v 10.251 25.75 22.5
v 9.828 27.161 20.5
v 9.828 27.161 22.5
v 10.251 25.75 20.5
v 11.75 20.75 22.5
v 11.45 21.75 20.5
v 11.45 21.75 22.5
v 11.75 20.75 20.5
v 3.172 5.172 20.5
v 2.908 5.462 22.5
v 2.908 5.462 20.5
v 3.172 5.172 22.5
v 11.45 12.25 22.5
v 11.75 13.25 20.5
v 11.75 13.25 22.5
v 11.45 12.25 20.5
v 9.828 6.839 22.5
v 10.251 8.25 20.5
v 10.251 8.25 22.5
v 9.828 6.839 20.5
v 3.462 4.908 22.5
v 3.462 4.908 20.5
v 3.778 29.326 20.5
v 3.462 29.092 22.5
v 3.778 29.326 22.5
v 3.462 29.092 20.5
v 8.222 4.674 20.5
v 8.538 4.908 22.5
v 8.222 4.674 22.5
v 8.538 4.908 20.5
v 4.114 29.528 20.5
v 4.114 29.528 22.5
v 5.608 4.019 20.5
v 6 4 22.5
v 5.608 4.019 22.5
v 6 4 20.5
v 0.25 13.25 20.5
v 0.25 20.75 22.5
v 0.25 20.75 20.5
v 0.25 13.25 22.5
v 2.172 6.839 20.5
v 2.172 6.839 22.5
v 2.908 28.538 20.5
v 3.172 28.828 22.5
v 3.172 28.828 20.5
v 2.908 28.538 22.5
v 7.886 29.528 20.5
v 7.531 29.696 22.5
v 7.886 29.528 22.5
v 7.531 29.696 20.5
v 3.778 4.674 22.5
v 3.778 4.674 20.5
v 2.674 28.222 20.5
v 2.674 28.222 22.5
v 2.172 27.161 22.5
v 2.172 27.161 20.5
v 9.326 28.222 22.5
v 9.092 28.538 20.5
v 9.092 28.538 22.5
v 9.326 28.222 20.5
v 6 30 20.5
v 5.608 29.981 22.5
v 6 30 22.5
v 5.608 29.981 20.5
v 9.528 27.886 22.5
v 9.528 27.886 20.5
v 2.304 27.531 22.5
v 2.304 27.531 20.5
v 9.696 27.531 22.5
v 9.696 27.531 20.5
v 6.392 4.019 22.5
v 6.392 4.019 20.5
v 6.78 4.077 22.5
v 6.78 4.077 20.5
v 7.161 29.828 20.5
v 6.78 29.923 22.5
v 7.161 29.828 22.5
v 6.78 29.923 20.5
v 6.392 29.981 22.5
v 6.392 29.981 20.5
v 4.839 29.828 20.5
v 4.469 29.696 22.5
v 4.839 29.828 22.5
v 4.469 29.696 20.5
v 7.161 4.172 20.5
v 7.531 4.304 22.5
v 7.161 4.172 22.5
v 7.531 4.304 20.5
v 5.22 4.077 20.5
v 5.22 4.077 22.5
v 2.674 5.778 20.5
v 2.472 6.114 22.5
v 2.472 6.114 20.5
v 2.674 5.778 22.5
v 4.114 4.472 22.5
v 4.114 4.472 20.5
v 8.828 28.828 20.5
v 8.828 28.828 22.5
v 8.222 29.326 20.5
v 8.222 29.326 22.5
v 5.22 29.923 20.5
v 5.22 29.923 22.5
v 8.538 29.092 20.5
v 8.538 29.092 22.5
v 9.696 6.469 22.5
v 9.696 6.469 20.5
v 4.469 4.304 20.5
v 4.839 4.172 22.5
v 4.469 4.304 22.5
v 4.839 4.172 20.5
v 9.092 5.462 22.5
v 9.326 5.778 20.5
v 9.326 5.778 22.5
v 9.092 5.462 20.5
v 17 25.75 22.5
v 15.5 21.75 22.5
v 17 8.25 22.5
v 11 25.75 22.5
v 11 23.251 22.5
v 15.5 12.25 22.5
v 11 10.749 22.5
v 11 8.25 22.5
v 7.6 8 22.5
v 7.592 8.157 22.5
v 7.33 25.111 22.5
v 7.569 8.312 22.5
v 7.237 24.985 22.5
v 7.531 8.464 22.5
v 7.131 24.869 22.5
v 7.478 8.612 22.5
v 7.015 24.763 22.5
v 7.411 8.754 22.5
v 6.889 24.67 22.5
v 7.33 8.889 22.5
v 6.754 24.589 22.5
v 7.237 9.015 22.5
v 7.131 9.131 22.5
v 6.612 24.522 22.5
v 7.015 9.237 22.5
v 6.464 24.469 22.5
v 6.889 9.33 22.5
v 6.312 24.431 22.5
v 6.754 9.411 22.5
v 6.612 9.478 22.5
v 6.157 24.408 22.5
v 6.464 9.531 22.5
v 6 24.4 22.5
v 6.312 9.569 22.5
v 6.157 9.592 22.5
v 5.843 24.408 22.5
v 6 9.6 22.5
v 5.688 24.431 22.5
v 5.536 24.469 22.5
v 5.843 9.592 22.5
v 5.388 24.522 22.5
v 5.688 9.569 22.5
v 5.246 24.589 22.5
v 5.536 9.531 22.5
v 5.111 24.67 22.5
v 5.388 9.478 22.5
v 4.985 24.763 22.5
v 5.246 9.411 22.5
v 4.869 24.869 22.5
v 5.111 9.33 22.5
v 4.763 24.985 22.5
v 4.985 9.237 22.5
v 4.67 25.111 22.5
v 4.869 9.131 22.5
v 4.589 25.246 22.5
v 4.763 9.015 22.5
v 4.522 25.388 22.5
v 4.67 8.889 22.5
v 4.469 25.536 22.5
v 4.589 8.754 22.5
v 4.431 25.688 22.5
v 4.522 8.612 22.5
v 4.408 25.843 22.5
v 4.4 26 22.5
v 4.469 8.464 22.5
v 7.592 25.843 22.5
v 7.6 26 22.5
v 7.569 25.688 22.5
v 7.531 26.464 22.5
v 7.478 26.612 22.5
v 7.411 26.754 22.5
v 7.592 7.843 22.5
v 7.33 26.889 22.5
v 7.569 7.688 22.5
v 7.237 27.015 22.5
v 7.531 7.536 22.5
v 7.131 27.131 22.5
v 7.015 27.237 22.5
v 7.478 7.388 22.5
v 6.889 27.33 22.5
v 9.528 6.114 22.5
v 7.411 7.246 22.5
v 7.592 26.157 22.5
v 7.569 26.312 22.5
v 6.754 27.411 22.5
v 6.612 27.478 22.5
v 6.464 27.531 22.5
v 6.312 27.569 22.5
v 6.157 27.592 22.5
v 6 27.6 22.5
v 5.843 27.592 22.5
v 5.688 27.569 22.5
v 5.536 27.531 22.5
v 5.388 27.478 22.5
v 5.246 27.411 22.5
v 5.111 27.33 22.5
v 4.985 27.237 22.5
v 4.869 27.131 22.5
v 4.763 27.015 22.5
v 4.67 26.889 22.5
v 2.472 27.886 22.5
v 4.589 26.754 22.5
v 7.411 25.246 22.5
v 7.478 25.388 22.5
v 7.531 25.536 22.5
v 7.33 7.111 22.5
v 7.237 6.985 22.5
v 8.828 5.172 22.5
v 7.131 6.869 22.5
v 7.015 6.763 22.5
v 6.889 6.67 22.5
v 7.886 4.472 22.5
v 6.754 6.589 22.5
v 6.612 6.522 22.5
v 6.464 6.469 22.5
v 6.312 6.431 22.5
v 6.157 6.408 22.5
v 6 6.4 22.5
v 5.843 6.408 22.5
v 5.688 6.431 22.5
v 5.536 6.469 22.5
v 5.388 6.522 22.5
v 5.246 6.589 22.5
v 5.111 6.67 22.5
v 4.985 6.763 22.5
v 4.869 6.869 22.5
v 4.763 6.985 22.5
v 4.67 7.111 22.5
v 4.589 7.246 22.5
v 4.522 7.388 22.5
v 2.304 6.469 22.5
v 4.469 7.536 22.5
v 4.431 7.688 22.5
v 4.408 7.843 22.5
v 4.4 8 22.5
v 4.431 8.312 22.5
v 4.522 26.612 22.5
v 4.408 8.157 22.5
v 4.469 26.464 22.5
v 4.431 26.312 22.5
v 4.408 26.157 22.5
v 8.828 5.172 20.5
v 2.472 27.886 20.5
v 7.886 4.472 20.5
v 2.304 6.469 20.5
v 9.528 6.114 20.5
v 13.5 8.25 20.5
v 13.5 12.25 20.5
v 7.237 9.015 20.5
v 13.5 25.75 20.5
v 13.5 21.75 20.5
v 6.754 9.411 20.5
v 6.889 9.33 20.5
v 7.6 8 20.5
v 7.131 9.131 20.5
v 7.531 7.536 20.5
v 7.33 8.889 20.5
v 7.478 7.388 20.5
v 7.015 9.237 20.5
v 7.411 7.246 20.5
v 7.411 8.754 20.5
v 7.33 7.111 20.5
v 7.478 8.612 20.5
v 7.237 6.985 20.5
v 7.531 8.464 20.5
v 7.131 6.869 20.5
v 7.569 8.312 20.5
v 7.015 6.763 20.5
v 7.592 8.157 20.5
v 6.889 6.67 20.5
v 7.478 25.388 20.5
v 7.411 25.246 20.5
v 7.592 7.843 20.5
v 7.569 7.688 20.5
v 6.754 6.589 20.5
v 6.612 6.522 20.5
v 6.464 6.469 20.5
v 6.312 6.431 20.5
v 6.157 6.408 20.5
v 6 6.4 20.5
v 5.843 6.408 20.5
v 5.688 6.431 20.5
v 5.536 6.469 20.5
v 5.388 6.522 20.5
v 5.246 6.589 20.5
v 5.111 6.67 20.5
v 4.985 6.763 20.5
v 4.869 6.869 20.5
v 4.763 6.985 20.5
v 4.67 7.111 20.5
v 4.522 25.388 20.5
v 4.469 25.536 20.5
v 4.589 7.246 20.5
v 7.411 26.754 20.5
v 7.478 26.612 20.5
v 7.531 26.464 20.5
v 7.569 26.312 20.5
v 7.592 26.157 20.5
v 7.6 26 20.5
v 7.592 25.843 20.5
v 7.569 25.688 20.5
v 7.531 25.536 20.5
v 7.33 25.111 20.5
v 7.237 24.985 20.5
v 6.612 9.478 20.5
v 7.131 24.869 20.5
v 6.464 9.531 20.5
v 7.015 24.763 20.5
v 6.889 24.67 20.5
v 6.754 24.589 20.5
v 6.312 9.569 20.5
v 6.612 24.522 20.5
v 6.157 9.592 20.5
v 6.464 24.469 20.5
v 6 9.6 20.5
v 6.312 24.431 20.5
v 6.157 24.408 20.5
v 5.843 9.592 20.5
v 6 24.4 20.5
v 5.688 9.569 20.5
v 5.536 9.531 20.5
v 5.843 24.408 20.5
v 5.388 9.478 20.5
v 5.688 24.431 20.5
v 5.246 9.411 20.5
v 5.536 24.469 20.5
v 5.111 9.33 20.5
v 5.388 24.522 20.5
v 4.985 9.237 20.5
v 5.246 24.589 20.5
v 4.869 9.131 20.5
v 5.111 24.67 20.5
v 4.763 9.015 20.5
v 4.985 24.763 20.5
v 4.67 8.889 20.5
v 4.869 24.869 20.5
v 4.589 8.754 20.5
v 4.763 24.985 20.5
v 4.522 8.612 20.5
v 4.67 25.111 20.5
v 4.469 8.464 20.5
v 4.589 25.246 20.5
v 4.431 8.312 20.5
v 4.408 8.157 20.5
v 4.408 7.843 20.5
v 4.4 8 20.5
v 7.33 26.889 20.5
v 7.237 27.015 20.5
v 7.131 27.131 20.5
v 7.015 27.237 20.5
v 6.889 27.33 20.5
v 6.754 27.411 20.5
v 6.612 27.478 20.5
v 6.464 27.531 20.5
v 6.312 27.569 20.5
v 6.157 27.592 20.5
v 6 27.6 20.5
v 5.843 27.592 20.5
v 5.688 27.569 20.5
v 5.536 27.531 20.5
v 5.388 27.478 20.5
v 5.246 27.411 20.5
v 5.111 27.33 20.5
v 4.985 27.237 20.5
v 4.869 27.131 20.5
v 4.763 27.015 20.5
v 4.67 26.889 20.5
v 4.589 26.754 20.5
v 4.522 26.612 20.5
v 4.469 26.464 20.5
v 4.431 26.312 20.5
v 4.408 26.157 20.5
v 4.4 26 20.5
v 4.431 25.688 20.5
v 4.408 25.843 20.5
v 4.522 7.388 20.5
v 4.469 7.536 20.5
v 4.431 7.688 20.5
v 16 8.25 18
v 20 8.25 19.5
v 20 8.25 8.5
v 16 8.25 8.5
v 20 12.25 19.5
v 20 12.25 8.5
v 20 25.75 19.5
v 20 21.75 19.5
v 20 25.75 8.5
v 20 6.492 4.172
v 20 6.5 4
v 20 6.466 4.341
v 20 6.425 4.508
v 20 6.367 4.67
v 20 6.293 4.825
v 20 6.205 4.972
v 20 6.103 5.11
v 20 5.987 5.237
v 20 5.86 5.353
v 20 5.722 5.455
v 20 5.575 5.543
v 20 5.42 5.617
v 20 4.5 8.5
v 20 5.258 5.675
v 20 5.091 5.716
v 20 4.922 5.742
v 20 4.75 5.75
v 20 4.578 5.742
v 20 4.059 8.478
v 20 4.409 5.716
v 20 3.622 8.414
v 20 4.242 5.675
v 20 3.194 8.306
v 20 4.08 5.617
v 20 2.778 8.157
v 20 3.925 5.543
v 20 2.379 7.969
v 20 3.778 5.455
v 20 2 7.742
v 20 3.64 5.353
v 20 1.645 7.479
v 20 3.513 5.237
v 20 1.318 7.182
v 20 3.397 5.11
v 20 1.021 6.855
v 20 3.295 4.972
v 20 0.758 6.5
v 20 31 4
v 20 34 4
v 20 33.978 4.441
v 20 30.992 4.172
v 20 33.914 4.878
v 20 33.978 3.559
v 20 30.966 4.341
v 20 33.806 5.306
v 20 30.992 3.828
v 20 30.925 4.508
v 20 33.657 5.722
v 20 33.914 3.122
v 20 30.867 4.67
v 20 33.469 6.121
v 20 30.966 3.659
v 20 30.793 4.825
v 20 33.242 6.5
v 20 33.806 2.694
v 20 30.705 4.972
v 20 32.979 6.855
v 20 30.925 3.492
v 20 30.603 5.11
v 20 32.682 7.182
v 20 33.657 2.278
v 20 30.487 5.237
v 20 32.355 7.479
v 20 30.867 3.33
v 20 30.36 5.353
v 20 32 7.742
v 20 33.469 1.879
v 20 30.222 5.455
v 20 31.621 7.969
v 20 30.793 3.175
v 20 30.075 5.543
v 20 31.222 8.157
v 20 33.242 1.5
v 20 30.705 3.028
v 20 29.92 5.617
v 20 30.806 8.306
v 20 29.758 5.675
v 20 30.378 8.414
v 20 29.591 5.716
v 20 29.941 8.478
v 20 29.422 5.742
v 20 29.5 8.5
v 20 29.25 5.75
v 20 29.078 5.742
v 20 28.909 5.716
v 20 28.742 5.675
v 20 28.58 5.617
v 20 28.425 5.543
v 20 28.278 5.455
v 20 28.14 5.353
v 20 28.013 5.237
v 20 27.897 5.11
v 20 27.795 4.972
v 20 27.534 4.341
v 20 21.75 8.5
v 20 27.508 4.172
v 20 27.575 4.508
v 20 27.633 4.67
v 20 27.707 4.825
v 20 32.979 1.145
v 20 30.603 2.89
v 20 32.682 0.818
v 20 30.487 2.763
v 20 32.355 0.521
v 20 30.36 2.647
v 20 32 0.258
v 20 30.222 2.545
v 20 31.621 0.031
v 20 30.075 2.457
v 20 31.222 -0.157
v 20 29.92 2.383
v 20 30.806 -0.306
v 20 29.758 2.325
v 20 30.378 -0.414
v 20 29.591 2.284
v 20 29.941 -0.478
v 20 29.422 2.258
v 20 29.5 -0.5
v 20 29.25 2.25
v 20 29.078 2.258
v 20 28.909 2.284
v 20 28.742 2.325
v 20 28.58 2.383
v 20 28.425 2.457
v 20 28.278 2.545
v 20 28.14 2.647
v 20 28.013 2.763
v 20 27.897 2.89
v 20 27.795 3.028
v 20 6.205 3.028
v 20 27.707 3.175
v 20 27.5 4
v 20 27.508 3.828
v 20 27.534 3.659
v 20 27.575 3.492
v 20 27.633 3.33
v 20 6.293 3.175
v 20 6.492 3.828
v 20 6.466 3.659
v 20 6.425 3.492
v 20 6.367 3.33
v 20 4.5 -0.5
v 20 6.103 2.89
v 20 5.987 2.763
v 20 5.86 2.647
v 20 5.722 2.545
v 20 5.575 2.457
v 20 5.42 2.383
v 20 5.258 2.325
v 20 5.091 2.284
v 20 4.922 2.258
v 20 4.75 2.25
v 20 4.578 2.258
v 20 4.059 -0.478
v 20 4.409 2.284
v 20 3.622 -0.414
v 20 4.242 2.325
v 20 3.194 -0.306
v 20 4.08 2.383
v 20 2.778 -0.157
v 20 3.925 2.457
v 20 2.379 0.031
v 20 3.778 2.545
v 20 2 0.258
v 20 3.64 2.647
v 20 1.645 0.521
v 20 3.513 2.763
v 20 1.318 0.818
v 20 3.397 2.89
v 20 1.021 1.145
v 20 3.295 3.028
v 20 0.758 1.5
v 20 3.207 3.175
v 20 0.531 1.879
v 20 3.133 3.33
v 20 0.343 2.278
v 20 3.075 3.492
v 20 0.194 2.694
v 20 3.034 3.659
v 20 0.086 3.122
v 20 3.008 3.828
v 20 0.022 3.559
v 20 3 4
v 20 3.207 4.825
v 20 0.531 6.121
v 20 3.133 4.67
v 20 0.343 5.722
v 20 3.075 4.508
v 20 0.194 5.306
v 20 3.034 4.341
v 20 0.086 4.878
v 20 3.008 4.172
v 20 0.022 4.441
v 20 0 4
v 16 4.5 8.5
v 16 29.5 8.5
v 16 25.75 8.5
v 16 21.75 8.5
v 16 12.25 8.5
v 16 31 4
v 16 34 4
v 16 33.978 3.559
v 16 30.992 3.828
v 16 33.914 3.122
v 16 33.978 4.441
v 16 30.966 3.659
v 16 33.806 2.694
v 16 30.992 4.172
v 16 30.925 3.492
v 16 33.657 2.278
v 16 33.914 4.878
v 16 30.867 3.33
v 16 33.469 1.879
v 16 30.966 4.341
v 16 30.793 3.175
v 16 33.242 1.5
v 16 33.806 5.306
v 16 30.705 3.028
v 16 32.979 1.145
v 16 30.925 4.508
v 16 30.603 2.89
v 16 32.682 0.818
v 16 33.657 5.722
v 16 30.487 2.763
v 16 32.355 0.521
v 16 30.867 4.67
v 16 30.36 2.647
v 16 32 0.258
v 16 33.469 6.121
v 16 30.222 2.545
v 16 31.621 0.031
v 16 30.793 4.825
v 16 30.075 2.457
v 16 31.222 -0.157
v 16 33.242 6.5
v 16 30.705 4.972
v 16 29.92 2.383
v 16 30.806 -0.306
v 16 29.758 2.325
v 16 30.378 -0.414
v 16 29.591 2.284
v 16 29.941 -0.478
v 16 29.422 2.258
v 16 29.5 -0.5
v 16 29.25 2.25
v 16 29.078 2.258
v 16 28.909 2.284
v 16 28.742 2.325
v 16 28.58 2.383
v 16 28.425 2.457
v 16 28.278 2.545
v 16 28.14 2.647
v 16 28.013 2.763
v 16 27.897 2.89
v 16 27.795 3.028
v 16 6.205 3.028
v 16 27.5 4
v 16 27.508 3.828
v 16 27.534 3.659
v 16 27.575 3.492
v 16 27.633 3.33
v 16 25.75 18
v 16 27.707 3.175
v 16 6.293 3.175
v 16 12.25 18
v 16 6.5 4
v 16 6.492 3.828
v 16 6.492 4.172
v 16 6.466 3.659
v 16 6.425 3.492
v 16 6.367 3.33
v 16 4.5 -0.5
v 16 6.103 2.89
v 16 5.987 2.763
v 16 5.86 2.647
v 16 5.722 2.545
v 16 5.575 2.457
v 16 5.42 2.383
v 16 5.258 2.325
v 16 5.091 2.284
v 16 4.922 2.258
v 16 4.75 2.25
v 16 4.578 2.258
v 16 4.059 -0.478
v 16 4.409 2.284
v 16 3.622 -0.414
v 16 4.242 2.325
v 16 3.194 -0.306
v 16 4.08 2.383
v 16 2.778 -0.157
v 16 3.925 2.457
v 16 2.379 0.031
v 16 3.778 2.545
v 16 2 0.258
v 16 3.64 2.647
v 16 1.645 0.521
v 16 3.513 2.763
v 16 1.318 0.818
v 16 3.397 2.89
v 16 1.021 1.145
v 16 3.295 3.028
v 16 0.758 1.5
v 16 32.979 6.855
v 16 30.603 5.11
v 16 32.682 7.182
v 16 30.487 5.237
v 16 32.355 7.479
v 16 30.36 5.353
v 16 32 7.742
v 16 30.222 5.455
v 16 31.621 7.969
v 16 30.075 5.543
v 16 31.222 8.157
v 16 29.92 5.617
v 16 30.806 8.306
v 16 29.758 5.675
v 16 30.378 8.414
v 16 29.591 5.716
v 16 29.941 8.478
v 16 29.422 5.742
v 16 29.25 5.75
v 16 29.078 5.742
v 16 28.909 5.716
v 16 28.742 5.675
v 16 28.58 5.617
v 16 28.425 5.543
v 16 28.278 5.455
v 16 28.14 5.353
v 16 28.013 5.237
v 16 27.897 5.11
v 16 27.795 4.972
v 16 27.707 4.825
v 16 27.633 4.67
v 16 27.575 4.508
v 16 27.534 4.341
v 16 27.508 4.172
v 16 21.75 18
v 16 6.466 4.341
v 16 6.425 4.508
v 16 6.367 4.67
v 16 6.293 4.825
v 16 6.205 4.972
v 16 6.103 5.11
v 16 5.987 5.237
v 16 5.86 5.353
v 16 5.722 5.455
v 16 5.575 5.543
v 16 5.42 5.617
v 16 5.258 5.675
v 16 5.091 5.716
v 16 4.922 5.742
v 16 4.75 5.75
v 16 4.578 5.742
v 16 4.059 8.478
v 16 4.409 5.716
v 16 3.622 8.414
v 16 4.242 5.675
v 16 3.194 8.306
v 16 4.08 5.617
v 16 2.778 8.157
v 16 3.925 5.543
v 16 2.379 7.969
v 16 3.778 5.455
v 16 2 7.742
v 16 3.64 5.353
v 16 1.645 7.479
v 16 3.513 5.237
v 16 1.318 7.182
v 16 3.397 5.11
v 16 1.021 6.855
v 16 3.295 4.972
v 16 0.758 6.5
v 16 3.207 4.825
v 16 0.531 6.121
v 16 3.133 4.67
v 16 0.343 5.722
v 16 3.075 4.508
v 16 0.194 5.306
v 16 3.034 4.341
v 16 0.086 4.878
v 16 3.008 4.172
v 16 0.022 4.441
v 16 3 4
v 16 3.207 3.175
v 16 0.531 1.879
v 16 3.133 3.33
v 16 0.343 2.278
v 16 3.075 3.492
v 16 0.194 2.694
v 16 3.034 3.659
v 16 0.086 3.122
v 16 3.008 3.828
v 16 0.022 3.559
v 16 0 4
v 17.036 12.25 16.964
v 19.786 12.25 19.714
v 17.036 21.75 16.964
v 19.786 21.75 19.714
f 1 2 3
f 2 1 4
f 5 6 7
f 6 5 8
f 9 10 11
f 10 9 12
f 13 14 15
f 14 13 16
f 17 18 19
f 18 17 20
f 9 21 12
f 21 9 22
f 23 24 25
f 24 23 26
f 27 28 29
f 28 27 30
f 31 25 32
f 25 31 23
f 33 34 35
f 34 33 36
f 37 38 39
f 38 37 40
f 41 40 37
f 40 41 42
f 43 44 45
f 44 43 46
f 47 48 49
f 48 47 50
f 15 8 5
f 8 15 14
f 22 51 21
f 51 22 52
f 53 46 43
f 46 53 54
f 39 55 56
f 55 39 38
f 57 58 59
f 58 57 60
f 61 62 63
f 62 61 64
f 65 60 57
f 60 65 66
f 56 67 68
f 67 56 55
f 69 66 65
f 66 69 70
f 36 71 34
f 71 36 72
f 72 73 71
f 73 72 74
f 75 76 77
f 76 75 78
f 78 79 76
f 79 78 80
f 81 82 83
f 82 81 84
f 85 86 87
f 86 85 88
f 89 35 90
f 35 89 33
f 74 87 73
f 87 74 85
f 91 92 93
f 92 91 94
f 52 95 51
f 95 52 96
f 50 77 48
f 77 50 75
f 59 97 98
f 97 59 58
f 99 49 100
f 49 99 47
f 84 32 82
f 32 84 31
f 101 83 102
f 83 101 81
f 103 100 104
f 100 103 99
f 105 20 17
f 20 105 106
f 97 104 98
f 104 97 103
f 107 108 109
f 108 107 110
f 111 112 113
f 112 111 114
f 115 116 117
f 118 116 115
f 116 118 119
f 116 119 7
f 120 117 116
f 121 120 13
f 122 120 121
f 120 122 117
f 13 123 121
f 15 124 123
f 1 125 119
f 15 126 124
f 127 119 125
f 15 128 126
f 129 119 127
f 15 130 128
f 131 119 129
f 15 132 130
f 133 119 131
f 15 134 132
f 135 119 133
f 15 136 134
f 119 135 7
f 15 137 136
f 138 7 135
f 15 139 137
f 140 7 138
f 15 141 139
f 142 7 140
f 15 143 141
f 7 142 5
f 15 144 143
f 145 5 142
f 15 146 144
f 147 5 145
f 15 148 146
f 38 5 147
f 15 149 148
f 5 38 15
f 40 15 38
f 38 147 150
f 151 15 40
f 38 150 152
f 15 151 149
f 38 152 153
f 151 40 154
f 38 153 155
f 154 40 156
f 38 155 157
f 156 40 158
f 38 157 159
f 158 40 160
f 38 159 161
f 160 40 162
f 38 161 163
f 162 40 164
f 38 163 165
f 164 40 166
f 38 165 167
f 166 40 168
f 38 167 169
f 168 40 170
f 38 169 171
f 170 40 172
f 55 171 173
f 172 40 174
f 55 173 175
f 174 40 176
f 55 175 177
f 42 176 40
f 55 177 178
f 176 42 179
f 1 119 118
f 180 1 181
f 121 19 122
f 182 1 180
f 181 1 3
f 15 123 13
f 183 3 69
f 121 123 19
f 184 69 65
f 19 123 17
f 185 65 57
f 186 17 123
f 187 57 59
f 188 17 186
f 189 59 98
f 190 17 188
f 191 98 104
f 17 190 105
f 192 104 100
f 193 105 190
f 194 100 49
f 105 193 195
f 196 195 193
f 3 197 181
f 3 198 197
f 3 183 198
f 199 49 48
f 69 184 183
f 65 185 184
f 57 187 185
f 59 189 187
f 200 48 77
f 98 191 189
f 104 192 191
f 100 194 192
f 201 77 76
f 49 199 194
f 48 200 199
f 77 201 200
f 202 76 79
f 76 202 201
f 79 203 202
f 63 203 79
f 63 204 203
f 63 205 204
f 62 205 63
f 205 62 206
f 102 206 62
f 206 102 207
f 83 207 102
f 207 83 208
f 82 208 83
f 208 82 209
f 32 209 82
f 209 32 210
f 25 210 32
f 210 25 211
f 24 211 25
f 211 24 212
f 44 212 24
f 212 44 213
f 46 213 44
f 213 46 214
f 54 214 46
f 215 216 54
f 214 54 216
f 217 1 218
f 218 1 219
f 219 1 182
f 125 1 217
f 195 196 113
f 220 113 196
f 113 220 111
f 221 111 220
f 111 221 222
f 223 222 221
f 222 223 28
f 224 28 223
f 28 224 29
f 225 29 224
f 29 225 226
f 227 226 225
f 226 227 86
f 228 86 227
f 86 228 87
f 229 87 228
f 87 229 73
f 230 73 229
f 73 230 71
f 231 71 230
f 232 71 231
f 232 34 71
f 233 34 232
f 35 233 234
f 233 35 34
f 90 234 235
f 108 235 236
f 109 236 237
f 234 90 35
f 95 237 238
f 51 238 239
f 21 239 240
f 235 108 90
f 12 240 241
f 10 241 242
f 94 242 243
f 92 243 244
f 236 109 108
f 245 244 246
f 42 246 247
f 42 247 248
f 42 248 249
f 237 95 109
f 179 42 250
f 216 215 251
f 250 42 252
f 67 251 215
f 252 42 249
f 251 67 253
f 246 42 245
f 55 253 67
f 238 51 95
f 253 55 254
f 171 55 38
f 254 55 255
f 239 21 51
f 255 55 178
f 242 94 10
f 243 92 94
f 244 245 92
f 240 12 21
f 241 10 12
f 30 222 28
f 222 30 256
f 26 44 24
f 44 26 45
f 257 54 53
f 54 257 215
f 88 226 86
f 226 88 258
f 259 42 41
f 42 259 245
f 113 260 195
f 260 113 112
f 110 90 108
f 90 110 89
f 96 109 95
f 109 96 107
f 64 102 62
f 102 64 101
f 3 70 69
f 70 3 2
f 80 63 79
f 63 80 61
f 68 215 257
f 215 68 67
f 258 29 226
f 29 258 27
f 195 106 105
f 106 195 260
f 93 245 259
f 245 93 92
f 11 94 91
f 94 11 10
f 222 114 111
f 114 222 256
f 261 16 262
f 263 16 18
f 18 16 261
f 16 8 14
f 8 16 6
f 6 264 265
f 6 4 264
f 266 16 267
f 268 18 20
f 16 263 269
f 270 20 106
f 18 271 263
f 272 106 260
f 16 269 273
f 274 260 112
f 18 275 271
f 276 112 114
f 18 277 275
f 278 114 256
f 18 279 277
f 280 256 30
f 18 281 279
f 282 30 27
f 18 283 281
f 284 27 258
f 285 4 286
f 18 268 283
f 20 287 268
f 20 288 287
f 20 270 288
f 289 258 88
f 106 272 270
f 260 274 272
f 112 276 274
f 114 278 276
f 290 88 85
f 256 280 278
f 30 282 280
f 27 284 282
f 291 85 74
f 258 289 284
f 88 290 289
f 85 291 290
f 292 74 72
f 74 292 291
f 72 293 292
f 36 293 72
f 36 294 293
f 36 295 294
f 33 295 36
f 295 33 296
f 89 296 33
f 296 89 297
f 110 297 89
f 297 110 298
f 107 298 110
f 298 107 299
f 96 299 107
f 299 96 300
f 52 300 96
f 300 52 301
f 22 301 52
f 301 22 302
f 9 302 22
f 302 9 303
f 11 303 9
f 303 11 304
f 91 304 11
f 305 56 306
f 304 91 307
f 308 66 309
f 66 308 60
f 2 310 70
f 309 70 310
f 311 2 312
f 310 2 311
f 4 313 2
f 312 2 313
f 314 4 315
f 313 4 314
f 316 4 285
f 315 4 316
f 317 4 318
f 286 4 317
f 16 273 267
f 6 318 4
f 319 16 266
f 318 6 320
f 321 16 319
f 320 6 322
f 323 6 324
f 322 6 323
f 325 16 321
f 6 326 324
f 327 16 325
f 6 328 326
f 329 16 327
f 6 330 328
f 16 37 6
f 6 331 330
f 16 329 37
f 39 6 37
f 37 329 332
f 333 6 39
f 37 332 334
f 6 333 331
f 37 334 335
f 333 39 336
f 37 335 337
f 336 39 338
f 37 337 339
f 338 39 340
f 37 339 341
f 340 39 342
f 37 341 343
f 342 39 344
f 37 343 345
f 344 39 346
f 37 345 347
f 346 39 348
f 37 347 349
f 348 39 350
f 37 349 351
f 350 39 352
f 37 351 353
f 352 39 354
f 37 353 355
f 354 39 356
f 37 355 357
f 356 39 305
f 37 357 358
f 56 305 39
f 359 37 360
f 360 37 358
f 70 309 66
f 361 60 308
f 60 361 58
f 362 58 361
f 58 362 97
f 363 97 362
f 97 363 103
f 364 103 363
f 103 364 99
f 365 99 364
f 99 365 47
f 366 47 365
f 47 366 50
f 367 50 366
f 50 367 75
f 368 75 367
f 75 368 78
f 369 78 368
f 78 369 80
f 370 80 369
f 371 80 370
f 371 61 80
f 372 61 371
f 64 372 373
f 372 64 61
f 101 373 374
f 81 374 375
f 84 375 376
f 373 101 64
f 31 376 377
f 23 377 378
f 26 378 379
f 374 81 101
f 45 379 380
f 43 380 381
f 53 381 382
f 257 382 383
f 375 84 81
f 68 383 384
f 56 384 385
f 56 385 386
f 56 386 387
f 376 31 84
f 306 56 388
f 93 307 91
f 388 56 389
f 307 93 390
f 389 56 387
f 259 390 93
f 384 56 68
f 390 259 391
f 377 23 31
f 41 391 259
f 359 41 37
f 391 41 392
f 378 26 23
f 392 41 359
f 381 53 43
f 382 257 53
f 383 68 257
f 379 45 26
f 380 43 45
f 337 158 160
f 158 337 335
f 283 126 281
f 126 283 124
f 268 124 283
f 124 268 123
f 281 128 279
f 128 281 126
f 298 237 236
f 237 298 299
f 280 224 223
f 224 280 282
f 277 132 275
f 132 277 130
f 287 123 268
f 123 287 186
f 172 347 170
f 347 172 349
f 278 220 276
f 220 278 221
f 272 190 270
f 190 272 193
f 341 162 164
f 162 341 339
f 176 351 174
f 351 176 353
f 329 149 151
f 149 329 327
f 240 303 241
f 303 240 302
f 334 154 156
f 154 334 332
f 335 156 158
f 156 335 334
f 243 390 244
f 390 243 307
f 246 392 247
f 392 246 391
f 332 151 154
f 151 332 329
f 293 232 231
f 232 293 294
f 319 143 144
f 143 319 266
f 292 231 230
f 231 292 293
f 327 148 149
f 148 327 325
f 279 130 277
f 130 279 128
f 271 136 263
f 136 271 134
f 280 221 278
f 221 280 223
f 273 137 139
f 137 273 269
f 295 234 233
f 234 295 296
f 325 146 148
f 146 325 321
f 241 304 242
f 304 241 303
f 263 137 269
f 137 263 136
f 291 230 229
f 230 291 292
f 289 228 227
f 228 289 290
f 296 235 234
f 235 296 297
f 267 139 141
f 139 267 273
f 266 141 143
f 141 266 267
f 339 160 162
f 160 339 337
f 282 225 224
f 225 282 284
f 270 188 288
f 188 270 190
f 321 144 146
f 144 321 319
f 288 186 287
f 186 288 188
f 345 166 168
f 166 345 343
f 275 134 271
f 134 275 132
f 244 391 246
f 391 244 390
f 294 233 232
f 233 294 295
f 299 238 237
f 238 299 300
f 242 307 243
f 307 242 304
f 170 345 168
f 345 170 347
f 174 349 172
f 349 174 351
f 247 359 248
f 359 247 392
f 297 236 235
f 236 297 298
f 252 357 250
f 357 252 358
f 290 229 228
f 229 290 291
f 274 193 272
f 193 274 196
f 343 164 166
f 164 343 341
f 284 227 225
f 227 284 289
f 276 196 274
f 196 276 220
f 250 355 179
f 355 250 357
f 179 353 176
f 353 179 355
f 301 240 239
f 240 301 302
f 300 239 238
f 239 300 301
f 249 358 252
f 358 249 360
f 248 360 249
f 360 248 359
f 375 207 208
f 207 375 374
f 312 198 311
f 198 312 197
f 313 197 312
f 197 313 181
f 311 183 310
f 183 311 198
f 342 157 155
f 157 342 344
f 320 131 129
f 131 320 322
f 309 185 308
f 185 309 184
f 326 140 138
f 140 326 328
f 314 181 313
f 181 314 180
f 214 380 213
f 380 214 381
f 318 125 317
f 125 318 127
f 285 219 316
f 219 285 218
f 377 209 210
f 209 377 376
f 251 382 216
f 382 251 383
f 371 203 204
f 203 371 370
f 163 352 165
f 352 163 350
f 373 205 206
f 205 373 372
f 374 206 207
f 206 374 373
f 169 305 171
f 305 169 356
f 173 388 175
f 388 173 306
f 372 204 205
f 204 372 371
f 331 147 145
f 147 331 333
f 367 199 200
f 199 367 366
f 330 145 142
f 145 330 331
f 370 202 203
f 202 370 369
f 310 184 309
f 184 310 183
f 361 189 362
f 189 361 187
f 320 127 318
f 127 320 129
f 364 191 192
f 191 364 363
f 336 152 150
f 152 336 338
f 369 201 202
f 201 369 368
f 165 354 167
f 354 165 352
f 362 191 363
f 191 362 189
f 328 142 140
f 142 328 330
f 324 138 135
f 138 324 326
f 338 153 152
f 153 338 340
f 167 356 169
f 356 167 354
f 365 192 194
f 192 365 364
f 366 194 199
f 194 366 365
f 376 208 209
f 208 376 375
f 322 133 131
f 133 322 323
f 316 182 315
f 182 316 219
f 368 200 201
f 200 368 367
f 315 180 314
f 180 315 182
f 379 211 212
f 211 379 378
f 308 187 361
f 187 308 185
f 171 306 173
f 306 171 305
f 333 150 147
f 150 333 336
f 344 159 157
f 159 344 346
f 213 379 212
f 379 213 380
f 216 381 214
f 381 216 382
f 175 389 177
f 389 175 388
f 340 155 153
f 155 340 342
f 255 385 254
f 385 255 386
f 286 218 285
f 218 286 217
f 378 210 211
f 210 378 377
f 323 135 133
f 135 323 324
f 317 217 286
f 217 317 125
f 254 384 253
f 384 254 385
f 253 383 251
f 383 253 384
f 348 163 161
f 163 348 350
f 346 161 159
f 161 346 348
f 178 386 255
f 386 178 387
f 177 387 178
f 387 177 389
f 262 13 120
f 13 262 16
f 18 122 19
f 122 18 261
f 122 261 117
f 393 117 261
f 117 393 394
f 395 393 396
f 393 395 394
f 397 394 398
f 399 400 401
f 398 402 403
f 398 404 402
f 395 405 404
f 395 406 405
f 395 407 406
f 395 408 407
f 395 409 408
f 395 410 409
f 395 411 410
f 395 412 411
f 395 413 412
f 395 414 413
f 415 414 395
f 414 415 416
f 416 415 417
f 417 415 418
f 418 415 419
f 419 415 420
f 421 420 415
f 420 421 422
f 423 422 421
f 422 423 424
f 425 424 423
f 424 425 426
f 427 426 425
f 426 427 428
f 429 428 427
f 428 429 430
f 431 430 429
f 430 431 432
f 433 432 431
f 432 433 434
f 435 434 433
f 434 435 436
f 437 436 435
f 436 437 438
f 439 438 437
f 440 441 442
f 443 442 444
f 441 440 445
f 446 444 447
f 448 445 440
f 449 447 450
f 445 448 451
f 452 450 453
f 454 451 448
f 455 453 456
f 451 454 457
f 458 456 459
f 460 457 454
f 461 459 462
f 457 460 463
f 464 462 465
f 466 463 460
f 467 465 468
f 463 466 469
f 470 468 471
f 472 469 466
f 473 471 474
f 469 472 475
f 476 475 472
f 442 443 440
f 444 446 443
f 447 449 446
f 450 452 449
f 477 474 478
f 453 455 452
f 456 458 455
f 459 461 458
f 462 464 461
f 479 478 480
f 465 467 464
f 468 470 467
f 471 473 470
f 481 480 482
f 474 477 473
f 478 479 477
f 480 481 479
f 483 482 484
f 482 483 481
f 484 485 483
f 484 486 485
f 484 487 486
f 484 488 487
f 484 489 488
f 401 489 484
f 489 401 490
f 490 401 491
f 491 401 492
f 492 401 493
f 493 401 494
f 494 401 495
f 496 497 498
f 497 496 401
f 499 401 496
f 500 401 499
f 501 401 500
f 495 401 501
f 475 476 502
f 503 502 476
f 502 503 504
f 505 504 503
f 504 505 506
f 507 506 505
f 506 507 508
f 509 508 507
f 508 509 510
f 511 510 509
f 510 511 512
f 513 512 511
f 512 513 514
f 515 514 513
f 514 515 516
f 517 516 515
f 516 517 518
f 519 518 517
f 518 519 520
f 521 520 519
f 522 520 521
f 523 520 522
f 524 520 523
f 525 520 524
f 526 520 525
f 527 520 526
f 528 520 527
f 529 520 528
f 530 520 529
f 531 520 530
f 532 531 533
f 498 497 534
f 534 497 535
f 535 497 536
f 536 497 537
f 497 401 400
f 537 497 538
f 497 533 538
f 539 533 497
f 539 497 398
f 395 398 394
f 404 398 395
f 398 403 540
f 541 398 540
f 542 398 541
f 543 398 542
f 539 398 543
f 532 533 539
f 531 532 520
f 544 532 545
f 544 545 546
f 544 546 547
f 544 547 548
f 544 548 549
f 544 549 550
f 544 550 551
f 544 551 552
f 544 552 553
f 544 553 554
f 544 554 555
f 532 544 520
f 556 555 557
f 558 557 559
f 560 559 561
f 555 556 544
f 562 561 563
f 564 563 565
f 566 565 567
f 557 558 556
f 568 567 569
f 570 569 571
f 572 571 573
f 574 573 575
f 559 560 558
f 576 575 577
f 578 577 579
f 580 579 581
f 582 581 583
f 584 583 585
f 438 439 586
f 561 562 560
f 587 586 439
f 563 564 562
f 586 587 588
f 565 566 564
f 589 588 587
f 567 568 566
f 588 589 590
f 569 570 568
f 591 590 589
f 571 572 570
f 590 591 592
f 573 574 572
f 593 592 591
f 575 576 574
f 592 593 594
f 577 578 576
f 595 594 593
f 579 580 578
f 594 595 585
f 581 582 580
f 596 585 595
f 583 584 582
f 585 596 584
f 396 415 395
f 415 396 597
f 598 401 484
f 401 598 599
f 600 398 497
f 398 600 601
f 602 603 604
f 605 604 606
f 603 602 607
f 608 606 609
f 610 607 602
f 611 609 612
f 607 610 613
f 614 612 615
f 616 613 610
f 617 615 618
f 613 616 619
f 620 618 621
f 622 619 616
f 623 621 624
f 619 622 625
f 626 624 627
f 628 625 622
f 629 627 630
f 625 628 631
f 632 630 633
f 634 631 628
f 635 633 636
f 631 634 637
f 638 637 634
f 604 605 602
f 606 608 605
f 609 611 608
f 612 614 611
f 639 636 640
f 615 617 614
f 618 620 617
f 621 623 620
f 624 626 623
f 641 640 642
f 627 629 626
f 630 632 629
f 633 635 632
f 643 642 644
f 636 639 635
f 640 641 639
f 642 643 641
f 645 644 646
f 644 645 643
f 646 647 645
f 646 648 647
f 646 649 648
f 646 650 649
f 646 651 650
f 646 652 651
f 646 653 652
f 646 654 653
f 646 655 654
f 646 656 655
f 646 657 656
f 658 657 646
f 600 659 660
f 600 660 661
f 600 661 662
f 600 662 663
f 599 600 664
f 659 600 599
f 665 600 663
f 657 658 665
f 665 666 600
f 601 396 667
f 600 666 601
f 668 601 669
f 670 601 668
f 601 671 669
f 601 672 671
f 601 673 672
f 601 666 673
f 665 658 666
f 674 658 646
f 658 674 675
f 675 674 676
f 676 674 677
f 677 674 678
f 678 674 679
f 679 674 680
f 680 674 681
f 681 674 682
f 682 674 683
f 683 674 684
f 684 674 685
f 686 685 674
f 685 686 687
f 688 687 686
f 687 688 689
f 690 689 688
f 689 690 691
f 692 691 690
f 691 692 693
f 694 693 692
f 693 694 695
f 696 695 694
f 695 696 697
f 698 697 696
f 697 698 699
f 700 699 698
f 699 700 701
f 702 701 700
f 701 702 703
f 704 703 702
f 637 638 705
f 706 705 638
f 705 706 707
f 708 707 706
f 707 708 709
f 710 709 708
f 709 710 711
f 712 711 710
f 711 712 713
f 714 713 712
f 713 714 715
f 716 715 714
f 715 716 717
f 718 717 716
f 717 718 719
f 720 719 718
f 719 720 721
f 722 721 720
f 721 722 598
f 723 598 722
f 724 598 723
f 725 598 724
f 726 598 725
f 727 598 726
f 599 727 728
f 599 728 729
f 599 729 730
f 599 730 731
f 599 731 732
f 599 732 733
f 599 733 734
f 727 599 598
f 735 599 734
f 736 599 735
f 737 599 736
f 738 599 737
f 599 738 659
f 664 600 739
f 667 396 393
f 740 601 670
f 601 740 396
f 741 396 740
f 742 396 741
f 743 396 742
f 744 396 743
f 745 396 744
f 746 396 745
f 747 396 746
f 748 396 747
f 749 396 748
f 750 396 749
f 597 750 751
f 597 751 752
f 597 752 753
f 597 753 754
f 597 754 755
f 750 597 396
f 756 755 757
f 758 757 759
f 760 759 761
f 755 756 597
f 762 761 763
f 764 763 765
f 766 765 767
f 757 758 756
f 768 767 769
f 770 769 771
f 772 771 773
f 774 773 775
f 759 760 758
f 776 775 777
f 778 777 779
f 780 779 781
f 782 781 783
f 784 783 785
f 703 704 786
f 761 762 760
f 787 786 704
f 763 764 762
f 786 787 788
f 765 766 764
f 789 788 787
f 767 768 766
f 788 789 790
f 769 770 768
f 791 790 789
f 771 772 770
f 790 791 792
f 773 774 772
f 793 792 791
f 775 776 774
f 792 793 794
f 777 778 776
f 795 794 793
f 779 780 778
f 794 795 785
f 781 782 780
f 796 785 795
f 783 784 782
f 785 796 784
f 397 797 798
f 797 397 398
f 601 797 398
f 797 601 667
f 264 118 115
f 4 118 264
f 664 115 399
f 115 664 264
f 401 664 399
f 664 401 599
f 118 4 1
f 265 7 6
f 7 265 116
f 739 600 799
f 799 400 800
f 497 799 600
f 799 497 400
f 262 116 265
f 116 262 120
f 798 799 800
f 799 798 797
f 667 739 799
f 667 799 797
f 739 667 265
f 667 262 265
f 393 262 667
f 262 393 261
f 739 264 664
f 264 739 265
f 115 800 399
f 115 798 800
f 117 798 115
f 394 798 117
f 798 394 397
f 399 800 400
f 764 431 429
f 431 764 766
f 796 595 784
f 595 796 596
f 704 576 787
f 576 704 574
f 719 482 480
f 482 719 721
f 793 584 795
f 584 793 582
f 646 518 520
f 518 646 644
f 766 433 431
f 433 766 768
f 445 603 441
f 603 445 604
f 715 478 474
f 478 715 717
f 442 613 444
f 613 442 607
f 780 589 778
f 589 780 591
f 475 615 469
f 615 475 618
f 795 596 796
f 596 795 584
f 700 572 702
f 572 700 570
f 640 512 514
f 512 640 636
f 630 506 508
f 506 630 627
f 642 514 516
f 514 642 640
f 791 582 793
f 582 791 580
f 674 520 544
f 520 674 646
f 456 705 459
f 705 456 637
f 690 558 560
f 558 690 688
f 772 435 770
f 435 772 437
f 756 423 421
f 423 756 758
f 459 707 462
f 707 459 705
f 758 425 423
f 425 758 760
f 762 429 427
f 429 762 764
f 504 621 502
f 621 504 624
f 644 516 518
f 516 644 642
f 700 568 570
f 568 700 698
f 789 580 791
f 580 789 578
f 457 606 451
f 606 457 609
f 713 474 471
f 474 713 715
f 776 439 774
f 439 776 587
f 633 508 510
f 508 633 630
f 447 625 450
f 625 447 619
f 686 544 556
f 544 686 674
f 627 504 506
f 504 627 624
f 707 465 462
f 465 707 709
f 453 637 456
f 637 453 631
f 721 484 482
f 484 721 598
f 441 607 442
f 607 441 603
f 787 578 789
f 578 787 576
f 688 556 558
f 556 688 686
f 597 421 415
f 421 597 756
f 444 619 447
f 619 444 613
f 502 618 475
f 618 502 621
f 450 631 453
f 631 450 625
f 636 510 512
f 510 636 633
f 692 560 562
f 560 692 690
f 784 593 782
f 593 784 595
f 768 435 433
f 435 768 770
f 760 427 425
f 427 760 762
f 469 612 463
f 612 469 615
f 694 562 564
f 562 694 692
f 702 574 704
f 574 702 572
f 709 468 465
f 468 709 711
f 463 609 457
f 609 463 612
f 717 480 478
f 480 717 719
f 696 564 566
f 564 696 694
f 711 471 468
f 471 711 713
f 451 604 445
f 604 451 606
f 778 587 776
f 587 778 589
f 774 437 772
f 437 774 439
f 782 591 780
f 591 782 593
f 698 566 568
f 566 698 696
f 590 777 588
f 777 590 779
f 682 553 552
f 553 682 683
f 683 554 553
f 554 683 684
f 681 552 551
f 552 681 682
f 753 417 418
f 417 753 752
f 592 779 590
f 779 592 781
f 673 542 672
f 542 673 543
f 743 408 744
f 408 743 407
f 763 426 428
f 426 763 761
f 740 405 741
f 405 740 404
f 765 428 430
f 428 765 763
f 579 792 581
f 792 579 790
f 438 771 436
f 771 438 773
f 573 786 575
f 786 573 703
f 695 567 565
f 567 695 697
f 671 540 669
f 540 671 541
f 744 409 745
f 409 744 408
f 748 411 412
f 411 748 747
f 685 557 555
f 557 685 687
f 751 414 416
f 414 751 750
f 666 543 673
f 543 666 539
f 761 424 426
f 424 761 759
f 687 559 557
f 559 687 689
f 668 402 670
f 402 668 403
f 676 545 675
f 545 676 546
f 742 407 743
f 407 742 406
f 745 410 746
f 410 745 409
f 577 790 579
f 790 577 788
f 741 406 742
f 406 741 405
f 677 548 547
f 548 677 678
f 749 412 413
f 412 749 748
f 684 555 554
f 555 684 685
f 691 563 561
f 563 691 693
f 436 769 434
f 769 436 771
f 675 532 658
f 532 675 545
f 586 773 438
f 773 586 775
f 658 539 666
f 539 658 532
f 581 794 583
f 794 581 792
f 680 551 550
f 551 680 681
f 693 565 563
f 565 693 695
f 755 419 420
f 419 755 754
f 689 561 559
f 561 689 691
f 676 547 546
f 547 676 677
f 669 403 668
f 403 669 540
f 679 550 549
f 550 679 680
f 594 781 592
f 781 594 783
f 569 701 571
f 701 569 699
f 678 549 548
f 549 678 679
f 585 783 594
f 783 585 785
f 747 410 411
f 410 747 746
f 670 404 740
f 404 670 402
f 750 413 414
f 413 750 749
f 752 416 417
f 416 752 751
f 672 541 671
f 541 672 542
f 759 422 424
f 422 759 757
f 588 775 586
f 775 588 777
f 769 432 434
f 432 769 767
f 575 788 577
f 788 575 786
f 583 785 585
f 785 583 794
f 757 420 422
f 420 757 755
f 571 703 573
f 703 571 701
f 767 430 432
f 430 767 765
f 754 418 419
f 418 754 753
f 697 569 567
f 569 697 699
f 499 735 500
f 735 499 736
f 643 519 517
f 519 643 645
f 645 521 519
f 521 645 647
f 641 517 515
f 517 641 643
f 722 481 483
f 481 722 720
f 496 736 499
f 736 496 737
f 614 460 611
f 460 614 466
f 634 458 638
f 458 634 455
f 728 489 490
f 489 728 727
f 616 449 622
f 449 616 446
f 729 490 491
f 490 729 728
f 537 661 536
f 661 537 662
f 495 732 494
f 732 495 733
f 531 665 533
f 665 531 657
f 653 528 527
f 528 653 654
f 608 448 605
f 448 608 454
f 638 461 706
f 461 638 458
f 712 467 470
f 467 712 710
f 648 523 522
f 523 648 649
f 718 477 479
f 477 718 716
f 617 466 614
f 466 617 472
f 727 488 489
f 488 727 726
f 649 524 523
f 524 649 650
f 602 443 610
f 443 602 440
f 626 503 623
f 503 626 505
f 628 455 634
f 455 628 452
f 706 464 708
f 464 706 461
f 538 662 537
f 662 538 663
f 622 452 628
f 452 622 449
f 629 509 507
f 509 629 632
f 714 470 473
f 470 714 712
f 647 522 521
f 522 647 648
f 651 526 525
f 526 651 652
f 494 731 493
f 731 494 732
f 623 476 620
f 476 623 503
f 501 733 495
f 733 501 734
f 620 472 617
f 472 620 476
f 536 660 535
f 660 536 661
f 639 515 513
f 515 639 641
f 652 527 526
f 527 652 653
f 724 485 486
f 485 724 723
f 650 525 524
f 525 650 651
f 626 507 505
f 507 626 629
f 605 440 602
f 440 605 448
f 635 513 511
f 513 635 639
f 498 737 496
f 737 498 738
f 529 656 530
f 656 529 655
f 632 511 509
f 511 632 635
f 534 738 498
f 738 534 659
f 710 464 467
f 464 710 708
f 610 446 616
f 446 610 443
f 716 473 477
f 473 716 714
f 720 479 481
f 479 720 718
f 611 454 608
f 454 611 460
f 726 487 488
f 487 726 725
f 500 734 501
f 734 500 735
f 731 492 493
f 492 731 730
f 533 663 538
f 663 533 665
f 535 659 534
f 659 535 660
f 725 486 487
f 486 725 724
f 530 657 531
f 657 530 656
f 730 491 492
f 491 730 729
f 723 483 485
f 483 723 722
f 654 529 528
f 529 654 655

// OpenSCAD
translate([6, 4, 20.5]) 
union()
{
  bl_touch_interface();
  struts();
}
translate([16, 0, 4]) rotate([0, 90, 0]) mount();


module mount()
{
  difference()
  {
    hull()
    {
      translate([0, 4.5, 0]) cylinder(h = 4, r = 4.5, $fn = 64);
      translate([0, 29.5, 0]) cylinder(h = 4, r = 4.5, $fn = 64);
    }
  
    translate([0,  4.75, 0]) cylinder(h = 4, r = 1.75, $fn = 64);
    translate([0, 29.25, 0]) cylinder(h = 4, r = 1.75, $fn = 64);
  }
}

module bl_touch_interface()
{
  difference()
  {

    hull()
    {
      translate([0, 4, 0]) cylinder(h = 2, r = 4, $fn = 64);
      translate([0, 22, 0]) cylinder(h = 2, r = 4, $fn = 64);
      translate([-5.75, 9.25, 0]) cube(size = [11.5, 7.5, 2]);
    }
  
    translate([0, 4, 0]) cylinder(h = 4, r = 1.6, $fn = 64);
    translate([0, 22, 0]) cylinder(h =45, r = 1.6, $fn = 64);
  } 
}

module struts()
{
  difference()
  {
    union()
    {
      translate([4, 4.25, 0]) cube(size = [10, 4, 2]);
      translate([10, 4.25, -12]) cube(size = [4, 4, 12]);
      translate([4, 17.75, 0]) cube(size = [10, 4, 2]);
      translate([10, 17.75, -12]) cube(size = [4, 4, 12]);
      
      translate([7.5, 21.75, 0]) rotate([90, 45, 0]) cube(size = [5, 5, 17.5]);
    }
       translate([5, 26, 2]) rotate([90, 0, 0]) cube(size = [10, 5, 30]);
    translate([11, 26, 2]) rotate([90, 45, 0]) cube(size = [5, 5, 30]);
   
  }
  

  
}
